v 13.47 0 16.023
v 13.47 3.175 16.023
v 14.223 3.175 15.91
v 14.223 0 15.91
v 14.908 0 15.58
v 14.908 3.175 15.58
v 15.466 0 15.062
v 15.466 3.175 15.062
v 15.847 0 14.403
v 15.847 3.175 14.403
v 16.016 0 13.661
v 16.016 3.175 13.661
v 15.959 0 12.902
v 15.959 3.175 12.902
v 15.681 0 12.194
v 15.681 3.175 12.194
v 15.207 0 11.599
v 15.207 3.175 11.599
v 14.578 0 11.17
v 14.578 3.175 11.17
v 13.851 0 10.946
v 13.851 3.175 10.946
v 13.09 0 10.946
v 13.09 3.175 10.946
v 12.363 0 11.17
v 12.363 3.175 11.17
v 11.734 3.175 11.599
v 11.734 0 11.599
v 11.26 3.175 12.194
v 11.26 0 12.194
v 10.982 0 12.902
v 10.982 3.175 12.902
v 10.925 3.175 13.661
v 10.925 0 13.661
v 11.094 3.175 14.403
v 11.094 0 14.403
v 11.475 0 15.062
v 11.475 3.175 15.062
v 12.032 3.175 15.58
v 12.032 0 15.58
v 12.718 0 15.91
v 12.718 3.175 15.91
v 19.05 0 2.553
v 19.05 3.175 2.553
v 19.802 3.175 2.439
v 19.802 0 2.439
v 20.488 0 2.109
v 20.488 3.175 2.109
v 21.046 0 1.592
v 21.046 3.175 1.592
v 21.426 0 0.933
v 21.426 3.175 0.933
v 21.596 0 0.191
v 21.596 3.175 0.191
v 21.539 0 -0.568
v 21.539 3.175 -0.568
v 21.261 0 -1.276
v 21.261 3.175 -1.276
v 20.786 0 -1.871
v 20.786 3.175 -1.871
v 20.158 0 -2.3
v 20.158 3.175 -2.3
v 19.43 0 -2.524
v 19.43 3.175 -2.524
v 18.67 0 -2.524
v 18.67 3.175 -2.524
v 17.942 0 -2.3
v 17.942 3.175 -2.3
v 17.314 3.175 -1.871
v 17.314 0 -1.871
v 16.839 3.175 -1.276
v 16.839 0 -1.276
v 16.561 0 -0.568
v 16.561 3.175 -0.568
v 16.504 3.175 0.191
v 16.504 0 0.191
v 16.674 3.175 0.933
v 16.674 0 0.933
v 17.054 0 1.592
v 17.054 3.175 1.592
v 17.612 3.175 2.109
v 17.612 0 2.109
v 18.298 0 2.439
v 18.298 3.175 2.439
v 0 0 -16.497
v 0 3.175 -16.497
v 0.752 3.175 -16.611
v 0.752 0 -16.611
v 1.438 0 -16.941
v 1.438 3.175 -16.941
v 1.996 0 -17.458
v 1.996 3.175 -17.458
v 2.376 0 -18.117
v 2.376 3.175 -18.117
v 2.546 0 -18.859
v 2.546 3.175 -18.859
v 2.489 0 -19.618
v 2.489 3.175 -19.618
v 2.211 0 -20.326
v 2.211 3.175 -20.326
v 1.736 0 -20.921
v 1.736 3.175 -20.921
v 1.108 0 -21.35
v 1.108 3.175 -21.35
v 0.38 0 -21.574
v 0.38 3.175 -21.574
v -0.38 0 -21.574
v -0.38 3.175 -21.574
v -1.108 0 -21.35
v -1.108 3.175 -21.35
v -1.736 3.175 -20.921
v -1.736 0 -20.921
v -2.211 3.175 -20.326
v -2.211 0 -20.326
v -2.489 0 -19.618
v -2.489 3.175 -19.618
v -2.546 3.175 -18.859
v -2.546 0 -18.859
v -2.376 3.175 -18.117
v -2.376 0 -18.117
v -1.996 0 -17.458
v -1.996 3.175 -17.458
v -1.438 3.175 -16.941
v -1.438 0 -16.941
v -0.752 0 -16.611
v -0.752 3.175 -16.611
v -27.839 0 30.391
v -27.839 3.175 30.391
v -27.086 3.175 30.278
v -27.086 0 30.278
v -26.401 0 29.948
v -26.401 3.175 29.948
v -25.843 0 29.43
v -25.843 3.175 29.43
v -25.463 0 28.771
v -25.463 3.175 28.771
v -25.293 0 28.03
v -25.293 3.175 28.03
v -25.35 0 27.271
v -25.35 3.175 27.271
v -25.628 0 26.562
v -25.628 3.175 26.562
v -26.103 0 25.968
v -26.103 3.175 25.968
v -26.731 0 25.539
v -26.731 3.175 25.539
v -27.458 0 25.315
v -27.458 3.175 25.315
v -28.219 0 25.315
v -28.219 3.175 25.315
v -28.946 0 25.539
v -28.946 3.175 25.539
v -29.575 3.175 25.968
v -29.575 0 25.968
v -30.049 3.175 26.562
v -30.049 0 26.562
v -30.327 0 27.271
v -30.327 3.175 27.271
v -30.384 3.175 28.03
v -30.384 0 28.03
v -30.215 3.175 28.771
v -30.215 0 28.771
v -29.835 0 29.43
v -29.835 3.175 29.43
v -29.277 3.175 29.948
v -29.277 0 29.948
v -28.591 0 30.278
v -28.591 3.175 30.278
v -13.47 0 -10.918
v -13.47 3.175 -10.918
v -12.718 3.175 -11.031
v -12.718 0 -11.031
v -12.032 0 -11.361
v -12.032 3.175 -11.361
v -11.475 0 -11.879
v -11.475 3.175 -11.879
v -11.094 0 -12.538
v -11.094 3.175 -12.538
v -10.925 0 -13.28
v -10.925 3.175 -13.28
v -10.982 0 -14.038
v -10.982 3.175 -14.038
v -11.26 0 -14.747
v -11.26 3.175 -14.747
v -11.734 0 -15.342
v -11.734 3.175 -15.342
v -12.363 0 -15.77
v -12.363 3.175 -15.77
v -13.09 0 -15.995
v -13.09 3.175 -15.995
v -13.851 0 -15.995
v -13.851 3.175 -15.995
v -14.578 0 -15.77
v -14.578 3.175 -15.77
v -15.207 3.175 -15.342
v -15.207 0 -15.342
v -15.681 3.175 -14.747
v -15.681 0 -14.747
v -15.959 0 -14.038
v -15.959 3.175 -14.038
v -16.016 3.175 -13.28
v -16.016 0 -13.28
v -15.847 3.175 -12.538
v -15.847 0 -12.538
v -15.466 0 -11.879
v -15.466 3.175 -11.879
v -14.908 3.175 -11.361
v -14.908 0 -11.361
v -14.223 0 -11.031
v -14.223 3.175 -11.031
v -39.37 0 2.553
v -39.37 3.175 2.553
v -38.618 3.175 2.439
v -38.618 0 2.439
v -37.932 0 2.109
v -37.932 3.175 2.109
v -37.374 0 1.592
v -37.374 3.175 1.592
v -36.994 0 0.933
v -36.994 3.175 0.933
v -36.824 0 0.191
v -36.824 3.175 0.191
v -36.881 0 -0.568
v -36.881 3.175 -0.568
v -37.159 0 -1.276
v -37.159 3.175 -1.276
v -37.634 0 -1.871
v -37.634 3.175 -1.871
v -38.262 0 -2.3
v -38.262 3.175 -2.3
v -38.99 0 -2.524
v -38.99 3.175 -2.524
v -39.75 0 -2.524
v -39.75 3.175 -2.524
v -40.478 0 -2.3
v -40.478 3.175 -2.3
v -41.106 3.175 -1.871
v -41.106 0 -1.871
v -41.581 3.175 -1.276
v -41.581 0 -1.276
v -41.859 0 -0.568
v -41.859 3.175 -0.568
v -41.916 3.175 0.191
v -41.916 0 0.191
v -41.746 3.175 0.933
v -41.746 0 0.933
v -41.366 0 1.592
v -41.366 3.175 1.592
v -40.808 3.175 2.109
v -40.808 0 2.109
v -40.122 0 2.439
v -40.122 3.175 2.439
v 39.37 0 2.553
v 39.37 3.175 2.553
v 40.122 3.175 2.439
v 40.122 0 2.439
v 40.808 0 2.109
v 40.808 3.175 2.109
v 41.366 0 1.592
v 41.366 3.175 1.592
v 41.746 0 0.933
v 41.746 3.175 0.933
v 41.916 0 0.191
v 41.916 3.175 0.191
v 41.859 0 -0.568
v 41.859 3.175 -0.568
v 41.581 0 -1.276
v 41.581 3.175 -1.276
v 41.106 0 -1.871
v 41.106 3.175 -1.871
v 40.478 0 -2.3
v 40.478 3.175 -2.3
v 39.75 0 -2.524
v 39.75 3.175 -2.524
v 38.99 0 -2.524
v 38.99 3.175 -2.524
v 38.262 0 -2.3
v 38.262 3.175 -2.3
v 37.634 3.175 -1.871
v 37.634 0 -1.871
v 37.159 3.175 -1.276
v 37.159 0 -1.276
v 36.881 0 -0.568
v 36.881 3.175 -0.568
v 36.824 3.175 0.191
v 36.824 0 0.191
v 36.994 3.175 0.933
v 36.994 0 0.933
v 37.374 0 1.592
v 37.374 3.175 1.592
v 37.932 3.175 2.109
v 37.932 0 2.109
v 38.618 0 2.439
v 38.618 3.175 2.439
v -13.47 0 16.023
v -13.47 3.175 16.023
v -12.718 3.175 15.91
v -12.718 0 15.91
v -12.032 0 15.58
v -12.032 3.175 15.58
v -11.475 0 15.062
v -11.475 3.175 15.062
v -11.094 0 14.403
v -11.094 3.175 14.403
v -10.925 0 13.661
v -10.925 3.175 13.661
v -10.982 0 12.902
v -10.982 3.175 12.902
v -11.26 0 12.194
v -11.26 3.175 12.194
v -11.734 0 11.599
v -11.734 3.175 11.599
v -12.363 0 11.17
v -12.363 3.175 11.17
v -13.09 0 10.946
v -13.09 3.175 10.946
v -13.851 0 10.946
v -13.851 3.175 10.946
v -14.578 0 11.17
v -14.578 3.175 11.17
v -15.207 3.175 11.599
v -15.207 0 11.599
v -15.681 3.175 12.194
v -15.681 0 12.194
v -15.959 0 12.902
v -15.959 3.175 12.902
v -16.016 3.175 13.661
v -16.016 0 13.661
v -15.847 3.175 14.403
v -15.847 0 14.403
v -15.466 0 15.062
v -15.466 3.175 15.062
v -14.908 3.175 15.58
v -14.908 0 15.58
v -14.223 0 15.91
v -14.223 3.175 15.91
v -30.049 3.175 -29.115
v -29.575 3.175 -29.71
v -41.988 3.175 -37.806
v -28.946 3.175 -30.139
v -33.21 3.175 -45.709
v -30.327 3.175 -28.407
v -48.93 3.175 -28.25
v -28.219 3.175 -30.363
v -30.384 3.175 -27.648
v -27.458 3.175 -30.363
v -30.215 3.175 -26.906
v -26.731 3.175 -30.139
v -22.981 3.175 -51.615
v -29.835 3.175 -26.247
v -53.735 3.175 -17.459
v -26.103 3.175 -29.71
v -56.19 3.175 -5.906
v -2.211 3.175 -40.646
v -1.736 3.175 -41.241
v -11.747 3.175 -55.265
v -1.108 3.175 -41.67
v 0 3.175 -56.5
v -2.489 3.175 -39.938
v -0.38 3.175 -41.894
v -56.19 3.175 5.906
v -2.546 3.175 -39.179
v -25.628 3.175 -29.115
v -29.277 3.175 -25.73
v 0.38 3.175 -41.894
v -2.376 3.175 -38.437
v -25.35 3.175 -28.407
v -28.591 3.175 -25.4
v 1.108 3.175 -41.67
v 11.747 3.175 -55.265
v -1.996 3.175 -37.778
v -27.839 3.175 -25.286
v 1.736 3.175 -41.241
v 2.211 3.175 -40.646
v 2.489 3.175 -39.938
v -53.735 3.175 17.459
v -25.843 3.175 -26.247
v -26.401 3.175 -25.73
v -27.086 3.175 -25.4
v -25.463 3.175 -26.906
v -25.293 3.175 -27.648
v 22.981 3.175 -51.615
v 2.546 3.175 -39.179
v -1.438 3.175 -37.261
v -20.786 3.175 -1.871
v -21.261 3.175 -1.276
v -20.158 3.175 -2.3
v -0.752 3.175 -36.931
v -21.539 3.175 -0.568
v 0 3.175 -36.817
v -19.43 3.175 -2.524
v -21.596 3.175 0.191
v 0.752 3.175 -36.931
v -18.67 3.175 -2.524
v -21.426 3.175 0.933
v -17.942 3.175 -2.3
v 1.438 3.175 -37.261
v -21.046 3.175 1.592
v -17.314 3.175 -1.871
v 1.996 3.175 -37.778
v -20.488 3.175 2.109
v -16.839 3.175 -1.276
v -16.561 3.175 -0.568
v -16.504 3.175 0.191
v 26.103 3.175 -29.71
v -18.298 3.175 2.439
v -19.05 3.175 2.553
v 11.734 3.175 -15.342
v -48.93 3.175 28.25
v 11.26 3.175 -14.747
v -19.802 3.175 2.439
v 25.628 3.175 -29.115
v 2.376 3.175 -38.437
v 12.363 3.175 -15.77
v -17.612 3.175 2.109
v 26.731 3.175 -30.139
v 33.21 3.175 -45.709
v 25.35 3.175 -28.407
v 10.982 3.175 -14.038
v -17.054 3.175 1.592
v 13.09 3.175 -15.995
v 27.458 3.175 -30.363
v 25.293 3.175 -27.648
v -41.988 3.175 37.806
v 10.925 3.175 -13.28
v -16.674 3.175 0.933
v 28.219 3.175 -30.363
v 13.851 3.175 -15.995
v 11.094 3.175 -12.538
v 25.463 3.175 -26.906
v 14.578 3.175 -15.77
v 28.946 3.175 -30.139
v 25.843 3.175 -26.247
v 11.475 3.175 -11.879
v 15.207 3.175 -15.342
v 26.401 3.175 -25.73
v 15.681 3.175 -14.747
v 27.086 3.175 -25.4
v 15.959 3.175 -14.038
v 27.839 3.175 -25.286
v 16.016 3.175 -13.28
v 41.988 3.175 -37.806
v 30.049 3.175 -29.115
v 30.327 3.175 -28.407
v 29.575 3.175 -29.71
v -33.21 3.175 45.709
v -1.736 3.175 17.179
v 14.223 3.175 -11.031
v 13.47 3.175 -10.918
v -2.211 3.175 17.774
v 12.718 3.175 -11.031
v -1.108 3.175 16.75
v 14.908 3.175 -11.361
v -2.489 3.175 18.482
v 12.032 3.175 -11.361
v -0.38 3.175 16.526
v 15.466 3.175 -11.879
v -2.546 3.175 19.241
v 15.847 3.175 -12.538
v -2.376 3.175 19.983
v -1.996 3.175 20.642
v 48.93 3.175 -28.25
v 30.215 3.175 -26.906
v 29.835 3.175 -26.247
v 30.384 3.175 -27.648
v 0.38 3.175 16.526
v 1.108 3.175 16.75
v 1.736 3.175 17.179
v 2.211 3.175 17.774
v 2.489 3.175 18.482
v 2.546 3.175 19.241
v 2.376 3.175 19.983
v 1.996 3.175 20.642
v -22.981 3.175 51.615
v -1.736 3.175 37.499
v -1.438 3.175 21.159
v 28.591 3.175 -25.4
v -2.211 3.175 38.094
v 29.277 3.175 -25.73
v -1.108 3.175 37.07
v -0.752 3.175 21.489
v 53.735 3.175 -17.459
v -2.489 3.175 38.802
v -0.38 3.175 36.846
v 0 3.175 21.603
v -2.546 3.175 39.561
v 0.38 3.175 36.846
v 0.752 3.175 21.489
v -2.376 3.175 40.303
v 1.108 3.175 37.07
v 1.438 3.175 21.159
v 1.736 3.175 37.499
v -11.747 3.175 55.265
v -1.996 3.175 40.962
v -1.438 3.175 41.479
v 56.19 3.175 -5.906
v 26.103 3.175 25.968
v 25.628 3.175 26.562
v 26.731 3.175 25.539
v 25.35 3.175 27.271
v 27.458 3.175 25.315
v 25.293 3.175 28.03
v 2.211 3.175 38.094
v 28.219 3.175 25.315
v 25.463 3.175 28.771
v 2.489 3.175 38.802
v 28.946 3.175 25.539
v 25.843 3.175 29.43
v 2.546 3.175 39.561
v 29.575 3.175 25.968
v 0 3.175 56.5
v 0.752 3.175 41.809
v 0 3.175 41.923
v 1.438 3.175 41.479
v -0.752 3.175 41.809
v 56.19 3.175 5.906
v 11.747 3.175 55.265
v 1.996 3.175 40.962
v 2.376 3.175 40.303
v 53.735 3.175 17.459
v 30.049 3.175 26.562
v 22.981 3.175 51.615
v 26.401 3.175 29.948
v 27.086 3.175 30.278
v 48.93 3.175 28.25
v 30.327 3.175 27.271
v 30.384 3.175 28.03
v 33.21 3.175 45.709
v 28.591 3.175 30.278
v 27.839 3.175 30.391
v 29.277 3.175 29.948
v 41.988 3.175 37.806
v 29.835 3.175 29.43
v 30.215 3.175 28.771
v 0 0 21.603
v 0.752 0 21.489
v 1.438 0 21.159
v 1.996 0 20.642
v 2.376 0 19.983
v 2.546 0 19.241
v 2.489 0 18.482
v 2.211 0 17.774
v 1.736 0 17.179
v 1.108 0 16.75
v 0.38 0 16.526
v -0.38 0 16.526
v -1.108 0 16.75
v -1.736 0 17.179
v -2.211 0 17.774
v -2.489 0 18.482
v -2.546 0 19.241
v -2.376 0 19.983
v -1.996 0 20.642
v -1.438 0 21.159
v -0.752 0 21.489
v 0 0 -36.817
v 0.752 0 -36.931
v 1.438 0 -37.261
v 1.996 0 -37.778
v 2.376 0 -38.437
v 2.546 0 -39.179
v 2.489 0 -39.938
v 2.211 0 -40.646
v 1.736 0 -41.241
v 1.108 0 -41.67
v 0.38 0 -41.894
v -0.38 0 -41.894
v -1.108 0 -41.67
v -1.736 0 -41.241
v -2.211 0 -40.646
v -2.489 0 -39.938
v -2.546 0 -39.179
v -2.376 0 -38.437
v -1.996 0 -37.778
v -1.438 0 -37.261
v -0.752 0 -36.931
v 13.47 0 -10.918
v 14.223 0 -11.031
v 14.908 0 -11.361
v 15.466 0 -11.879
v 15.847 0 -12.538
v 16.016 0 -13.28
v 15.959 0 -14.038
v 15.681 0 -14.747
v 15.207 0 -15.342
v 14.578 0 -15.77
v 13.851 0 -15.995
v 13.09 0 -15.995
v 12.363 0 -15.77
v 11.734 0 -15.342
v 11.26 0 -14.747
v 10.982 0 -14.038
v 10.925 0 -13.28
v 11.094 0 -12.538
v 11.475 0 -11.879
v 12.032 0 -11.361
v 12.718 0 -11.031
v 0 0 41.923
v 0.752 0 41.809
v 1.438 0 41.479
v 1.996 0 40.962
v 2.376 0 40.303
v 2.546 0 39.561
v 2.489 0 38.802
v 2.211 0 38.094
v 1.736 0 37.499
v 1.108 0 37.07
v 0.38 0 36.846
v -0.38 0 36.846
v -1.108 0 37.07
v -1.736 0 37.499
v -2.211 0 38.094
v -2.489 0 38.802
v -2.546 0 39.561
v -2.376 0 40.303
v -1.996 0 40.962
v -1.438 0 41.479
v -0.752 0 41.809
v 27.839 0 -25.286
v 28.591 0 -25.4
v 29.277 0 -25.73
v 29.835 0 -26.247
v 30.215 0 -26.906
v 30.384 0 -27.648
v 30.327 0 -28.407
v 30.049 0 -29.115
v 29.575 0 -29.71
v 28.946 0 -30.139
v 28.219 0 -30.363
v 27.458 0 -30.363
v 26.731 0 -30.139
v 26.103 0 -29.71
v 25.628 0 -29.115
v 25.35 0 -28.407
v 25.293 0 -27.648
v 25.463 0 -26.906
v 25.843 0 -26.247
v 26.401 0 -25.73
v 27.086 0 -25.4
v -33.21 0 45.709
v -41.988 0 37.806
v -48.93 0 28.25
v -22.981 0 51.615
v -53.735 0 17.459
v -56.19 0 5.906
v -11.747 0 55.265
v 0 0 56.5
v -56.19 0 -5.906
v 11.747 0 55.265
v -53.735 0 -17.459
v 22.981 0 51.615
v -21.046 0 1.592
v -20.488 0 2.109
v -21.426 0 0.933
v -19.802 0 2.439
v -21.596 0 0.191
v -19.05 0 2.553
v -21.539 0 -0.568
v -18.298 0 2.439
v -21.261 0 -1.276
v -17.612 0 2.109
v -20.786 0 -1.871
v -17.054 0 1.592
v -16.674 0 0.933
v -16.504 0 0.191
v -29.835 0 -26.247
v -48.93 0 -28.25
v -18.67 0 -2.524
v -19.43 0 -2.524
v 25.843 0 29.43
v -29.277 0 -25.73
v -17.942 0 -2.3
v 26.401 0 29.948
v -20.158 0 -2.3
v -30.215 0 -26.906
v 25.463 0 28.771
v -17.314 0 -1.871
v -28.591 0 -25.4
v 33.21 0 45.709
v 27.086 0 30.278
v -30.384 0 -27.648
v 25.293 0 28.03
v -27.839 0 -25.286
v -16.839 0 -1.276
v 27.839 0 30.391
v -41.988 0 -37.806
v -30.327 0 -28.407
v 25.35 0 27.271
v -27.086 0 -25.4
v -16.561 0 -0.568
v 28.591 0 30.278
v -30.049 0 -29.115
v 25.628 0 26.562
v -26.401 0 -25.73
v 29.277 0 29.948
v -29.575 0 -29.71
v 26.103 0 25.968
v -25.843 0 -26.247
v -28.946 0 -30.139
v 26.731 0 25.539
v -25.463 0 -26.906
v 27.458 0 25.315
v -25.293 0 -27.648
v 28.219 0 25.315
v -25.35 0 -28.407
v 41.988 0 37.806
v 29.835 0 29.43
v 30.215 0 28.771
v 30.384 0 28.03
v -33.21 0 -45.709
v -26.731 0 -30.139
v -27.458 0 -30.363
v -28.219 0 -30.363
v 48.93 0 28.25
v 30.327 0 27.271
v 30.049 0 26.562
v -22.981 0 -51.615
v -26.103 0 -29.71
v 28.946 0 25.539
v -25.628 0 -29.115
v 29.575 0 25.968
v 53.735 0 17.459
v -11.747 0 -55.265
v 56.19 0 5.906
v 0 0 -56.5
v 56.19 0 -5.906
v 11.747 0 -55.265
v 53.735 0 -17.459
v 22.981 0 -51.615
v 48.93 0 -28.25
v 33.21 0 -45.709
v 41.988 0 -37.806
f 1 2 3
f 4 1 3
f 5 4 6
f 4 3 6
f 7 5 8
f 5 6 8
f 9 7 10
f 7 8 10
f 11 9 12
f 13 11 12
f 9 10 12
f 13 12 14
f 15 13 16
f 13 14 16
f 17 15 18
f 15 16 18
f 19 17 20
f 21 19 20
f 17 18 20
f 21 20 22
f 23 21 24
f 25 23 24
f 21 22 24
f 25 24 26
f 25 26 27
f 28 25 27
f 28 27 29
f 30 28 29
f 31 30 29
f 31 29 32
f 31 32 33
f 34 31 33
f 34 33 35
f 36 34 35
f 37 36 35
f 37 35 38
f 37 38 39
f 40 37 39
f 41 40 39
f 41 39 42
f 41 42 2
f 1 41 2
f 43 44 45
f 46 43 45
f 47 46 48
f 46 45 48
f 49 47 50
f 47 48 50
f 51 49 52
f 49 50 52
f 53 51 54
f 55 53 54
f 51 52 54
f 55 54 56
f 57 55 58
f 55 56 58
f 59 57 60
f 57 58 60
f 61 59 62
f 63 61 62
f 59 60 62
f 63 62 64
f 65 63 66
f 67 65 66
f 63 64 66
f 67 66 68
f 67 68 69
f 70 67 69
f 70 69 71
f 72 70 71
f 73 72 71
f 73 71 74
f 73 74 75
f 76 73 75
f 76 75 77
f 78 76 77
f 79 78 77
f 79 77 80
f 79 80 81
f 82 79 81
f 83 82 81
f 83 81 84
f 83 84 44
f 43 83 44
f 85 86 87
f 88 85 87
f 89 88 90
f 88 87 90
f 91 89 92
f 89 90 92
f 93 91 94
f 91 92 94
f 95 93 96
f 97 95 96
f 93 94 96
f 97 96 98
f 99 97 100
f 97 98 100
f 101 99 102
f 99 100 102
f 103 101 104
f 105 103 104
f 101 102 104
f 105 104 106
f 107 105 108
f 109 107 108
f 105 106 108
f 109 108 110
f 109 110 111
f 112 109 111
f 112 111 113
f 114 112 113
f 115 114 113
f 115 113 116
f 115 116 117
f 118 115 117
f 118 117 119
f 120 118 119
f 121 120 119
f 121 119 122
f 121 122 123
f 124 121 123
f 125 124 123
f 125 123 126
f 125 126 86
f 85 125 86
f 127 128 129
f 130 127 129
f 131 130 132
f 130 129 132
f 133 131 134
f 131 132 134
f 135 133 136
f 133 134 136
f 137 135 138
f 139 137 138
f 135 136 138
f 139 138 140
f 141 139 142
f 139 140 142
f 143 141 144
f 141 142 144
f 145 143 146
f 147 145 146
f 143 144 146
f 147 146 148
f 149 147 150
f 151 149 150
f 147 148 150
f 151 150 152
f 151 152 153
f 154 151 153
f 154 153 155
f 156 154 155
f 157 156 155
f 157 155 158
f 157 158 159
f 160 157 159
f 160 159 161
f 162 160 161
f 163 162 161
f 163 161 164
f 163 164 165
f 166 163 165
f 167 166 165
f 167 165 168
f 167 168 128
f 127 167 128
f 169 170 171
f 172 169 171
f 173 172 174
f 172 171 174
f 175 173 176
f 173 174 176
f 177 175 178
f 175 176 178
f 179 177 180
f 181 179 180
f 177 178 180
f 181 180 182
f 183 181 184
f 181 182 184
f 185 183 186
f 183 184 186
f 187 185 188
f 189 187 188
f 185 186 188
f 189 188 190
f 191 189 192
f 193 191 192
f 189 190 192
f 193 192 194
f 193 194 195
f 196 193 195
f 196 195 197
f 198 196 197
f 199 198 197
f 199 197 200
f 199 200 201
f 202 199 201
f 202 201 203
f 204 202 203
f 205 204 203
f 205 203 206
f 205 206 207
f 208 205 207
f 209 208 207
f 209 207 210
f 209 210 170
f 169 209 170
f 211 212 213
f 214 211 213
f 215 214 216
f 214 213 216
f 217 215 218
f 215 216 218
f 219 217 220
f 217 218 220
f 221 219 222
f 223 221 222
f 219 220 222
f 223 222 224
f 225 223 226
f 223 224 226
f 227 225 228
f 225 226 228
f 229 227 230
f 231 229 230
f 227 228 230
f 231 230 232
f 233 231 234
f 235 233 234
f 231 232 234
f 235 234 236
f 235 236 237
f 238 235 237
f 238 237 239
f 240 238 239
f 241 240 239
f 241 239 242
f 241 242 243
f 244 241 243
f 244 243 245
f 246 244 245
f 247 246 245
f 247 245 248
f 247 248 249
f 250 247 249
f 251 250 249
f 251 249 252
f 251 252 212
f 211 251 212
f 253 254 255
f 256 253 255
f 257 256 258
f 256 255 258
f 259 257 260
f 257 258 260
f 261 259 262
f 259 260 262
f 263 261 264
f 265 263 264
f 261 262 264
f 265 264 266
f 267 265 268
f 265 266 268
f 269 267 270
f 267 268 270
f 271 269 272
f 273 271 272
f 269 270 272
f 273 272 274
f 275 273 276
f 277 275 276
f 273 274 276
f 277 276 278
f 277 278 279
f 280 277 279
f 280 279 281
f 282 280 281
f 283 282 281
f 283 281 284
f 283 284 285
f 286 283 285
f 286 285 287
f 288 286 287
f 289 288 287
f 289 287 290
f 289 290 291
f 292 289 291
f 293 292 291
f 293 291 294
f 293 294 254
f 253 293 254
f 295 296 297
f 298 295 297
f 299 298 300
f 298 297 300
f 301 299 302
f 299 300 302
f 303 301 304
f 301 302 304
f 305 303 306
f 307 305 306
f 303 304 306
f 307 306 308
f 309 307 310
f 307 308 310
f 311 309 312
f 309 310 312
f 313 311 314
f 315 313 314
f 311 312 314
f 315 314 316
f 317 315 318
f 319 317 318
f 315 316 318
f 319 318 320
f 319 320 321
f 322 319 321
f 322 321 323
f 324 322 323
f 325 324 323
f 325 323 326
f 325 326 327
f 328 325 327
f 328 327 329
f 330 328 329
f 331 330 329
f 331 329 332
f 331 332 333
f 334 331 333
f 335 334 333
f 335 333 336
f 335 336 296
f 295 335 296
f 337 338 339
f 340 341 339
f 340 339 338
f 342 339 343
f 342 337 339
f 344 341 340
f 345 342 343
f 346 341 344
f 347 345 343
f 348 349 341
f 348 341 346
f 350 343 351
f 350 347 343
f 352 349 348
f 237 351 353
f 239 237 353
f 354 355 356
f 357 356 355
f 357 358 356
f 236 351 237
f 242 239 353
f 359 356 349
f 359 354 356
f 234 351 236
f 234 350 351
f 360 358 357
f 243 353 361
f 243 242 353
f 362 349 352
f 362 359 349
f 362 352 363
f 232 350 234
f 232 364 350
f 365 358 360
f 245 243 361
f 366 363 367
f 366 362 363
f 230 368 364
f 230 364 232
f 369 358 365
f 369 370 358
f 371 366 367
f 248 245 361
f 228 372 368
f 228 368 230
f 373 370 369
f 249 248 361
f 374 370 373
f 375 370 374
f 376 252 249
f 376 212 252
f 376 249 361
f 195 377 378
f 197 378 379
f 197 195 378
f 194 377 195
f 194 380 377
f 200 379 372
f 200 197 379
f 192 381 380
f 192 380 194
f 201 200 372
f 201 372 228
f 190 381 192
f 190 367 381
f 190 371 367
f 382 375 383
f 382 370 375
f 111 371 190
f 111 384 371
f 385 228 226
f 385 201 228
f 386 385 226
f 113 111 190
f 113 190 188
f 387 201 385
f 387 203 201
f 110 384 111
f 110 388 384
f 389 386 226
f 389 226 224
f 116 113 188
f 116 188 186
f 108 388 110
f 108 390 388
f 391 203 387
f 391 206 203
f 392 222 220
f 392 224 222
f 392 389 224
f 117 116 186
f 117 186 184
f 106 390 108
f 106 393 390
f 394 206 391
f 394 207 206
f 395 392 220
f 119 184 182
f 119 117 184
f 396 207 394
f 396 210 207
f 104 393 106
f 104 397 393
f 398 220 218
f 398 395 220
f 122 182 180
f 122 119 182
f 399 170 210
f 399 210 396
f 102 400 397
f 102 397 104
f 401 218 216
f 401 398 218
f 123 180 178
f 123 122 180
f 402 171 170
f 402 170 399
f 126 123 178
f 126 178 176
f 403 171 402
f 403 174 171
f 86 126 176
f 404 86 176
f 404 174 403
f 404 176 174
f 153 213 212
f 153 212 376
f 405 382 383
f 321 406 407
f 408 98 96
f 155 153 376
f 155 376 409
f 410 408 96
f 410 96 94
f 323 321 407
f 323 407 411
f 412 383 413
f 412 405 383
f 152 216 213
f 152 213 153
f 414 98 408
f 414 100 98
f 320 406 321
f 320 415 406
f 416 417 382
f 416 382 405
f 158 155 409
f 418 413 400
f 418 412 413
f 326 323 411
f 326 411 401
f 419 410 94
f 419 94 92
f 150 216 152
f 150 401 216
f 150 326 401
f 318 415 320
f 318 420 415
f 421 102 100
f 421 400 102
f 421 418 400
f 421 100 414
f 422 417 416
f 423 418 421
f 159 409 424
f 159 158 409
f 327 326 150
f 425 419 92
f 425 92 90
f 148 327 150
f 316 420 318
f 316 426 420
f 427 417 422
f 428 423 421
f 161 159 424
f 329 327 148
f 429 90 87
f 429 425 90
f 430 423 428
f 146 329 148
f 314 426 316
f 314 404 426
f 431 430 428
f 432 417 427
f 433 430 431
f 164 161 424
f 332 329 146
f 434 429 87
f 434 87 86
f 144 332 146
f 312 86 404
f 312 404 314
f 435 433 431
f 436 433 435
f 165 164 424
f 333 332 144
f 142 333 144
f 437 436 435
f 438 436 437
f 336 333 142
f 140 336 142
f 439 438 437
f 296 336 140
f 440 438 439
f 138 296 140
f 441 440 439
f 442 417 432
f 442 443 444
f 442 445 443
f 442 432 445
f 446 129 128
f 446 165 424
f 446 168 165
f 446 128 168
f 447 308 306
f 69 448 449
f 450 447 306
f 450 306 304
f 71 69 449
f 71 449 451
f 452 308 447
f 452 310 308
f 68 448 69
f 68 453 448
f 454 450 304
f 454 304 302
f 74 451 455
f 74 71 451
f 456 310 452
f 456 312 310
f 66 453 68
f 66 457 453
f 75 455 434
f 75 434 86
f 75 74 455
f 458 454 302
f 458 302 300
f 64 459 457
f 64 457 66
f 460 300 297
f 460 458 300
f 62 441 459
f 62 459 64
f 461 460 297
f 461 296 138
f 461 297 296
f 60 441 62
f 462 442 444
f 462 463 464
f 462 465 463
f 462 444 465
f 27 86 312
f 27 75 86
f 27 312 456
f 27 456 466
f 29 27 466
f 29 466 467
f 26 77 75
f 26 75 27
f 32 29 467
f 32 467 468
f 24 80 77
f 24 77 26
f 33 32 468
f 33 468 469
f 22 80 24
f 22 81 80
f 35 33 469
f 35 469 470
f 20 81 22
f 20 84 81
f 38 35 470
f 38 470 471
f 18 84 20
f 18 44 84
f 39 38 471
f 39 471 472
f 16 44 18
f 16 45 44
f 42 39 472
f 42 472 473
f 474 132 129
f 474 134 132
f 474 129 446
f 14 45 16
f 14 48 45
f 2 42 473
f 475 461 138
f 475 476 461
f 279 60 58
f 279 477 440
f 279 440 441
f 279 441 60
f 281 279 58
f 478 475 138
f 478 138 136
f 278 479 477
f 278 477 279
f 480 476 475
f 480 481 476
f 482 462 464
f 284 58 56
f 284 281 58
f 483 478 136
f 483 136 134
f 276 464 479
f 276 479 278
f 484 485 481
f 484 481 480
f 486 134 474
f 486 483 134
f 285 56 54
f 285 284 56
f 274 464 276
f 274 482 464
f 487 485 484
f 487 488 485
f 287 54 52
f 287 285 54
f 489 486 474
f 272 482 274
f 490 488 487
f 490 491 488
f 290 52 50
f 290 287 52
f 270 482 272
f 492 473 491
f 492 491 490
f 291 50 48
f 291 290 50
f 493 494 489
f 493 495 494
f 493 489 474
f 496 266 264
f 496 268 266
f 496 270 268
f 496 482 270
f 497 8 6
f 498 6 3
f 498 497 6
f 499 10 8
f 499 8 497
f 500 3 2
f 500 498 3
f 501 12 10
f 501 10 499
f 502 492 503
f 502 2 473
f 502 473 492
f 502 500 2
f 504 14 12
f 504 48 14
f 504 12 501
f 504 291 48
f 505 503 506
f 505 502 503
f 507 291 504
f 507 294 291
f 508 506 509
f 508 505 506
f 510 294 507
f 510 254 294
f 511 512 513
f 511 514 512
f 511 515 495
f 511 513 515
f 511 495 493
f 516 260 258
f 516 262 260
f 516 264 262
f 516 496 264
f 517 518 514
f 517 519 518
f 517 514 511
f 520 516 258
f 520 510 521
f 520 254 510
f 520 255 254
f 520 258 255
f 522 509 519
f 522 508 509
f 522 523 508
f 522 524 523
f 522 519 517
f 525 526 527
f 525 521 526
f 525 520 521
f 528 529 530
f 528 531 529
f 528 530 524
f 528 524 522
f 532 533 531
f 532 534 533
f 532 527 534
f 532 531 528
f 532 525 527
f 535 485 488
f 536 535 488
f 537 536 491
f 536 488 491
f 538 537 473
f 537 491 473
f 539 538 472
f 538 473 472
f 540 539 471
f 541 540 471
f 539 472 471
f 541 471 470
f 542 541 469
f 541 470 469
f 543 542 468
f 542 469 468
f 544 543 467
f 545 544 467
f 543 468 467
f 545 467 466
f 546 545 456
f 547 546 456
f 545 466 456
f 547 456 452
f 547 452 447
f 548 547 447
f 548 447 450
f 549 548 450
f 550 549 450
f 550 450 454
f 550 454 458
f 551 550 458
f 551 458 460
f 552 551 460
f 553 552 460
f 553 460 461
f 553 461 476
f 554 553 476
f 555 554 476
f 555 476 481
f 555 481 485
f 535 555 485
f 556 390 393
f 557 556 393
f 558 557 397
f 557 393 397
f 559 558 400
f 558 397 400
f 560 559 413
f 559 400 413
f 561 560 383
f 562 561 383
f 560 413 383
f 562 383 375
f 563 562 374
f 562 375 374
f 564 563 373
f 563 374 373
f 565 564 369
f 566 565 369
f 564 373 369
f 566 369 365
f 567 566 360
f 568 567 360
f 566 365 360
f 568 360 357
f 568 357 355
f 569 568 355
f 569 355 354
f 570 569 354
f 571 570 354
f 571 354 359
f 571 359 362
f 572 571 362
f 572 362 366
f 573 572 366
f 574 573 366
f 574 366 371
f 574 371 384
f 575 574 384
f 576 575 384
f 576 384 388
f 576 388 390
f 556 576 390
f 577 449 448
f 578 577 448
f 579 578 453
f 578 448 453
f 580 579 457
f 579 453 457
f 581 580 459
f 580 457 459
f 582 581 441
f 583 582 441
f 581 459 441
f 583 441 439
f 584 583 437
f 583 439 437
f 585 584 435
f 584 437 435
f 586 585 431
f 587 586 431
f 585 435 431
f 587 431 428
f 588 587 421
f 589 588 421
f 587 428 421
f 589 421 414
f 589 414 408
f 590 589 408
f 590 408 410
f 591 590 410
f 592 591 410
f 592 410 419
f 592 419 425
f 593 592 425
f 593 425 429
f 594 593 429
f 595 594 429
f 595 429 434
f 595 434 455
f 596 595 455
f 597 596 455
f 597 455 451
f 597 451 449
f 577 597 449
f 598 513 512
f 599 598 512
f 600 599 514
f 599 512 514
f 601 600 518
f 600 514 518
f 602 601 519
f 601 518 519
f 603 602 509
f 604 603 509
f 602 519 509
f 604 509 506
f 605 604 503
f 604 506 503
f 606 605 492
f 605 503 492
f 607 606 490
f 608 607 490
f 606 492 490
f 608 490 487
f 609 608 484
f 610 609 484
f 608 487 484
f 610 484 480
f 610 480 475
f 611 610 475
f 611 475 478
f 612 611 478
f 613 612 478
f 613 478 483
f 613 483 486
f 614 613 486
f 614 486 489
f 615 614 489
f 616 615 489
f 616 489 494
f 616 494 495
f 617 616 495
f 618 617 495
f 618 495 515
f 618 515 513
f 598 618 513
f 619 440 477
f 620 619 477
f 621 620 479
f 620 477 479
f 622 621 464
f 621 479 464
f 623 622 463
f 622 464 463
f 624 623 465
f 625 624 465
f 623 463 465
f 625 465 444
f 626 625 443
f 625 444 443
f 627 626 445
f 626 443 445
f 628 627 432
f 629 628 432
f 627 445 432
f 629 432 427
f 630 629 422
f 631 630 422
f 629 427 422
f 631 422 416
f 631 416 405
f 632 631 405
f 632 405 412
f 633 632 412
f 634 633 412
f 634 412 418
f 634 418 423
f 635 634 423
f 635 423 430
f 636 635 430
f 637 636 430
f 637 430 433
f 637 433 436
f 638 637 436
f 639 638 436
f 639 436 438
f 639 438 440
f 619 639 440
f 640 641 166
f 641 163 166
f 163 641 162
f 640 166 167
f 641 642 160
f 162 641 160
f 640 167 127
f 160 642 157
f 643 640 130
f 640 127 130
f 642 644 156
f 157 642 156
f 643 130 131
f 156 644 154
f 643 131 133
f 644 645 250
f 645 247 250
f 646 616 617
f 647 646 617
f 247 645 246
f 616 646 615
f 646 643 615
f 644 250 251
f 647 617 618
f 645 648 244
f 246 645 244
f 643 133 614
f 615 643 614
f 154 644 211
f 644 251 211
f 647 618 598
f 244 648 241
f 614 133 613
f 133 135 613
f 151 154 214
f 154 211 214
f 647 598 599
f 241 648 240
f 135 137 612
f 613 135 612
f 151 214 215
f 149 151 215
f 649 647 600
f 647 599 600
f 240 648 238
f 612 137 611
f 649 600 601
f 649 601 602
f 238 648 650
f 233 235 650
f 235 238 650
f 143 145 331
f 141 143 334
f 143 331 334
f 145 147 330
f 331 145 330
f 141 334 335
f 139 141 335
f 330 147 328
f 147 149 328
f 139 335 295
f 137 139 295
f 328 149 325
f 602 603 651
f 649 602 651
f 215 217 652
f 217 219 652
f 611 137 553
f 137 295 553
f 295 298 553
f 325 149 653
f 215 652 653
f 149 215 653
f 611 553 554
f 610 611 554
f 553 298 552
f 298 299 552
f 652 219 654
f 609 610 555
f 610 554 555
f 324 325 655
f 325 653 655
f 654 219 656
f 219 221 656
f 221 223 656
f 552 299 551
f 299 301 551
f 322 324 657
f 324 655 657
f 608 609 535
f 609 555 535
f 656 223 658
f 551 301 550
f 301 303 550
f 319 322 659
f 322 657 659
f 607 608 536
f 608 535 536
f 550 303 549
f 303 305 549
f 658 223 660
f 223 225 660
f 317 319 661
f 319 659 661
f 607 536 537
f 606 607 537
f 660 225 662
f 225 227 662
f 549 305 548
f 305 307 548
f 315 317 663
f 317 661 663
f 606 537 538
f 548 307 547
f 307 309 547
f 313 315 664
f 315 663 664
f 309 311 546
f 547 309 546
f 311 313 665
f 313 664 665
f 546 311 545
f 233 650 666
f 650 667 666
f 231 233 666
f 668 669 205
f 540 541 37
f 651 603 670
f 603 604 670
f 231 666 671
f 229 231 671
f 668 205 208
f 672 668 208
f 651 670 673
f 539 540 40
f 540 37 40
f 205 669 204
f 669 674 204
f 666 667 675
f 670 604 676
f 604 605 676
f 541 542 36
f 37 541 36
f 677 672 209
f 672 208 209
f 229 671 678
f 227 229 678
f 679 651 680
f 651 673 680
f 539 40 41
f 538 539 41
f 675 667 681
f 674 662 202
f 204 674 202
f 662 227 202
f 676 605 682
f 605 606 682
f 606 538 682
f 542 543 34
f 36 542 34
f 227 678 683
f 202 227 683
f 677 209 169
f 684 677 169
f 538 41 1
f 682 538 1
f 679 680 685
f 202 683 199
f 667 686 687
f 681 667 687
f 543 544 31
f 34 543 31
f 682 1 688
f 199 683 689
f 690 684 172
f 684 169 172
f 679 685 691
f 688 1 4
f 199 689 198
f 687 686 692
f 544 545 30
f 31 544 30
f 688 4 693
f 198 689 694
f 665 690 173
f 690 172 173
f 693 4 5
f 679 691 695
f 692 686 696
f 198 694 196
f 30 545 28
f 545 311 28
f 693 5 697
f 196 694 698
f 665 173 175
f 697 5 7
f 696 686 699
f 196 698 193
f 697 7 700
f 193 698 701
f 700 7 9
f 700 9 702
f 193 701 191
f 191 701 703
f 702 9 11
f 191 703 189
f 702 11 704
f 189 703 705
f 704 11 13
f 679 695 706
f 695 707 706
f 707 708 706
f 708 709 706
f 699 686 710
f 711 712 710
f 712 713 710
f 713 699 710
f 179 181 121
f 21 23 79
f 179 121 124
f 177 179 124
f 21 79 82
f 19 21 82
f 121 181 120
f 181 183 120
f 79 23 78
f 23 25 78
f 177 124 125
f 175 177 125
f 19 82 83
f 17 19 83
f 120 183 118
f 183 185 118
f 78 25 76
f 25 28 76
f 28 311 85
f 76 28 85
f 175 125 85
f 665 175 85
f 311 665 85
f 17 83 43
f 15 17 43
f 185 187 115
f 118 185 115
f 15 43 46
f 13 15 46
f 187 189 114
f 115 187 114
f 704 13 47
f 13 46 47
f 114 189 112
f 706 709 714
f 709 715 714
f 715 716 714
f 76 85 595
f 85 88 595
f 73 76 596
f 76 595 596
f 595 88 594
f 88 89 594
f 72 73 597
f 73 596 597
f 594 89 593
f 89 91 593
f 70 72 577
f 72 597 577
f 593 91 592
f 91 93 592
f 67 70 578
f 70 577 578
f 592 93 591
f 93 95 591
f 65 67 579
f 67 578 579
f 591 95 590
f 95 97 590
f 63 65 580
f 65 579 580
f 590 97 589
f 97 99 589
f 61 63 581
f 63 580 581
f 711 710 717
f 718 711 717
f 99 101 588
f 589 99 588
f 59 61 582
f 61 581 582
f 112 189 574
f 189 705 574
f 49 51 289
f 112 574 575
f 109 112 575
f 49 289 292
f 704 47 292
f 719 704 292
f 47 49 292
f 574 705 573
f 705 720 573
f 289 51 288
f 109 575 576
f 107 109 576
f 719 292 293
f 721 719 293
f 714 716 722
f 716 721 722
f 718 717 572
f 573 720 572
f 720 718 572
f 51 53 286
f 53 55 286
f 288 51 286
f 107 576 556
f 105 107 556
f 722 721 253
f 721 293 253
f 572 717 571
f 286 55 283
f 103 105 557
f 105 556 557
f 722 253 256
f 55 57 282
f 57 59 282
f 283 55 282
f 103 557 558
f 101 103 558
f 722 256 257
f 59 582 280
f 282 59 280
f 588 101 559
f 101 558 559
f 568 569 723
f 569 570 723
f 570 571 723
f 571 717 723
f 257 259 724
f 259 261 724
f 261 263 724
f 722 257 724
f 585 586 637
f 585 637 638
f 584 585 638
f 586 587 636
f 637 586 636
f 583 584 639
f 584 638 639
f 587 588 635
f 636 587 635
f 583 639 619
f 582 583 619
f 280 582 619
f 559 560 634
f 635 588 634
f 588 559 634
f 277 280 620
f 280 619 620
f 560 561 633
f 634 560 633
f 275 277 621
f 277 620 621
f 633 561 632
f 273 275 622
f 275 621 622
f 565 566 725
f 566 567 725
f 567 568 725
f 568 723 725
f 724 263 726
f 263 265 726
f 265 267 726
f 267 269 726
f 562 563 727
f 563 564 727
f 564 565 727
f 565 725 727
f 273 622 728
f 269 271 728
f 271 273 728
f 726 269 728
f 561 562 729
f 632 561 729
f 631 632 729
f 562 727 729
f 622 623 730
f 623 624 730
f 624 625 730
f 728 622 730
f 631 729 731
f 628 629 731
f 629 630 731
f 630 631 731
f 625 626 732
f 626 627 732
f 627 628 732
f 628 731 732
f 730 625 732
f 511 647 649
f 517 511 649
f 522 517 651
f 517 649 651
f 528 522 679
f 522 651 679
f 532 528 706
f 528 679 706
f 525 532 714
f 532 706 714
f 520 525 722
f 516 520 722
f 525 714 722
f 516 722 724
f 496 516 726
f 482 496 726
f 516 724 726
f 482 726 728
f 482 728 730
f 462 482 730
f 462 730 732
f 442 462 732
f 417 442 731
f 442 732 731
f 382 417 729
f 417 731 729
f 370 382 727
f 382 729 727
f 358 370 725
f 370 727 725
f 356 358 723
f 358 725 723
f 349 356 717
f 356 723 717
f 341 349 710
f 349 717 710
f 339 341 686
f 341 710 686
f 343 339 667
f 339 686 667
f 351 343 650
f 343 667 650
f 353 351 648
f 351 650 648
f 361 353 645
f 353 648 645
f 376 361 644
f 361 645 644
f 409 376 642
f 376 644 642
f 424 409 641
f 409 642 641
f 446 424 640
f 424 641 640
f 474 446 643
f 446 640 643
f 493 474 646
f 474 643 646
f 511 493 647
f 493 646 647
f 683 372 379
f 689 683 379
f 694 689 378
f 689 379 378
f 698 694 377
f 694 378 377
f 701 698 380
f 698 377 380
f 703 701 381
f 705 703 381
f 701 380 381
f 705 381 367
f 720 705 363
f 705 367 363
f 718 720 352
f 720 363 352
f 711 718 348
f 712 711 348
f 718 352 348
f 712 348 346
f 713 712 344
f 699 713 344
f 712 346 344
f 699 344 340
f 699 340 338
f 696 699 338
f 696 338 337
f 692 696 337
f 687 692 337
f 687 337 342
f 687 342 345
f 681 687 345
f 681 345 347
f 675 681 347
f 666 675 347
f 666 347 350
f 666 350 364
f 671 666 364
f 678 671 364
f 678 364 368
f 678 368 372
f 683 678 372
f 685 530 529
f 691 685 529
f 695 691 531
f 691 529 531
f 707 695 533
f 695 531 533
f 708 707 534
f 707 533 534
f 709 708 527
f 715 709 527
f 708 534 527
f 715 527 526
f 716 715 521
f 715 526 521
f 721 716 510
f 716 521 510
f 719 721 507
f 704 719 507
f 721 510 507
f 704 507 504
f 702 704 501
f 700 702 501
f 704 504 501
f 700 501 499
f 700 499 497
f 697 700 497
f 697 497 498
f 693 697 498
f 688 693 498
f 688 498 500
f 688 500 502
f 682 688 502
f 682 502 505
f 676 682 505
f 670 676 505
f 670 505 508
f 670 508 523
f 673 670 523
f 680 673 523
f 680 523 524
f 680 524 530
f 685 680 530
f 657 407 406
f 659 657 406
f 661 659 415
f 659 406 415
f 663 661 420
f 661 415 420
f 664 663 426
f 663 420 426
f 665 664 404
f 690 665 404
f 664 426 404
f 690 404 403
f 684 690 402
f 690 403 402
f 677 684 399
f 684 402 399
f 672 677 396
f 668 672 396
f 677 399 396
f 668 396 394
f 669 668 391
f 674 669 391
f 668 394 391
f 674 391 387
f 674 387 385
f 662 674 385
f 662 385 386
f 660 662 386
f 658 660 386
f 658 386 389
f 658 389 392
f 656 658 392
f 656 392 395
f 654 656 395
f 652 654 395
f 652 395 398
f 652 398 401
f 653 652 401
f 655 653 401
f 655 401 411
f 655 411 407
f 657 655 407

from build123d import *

# Parameters (mm, degrees)
SKETCH1_R               = 56.5
SKETCH1_R_2             = 2.5527
BOSS_EXTRUDE1_DEPTH     = 3.175
F_1_4_20_TAPPED_HOLE1_D = 5.1054


with BuildPart() as part:
    # Sketch1 → Boss-Extrude1 (new body)
    # profile 1 of 9: a face of its own
    with BuildSketch(Plane(origin=(0, 0, 0), x_dir=(1, 0, 0), z_dir=(0, 1, 0))):
        with Locations(Location((0, 0, 0), (0, 0, 270))):
            Circle(SKETCH1_R)
        with Locations((-13.470384182, 13.470384182)):
            Circle(SKETCH1_R_2, mode=Mode.SUBTRACT)
        with Locations((-19.05, 0)):
            Circle(SKETCH1_R_2, mode=Mode.SUBTRACT)
        with Locations((-13.470384182, -13.470384182)):
            Circle(SKETCH1_R_2, mode=Mode.SUBTRACT)
        with Locations((0, -19.05)):
            Circle(SKETCH1_R_2, mode=Mode.SUBTRACT)
        with Locations((13.470384182, -13.470384182)):
            Circle(SKETCH1_R_2, mode=Mode.SUBTRACT)
        with Locations((19.05, 0)):
            Circle(SKETCH1_R_2, mode=Mode.SUBTRACT)
        with Locations((13.470384182, 13.470384182)):
            Circle(SKETCH1_R_2, mode=Mode.SUBTRACT)
        with Locations((0, 19.05)):
            Circle(SKETCH1_R_2, mode=Mode.SUBTRACT)
    # profile 2 of 9: a face of its own
    with BuildSketch(Plane(origin=(0, 0, 0), x_dir=(1, 0, 0), z_dir=(0, 1, 0))):
        with Locations((13.470384182, 13.470384182)):
            Circle(SKETCH1_R_2)
    # profile 3 of 9: a face of its own
    with BuildSketch(Plane(origin=(0, 0, 0), x_dir=(1, 0, 0), z_dir=(0, 1, 0))):
        with Locations((0, 19.05)):
            Circle(SKETCH1_R_2)
    # profile 4 of 9: a face of its own
    with BuildSketch(Plane(origin=(0, 0, 0), x_dir=(1, 0, 0), z_dir=(0, 1, 0))):
        with Locations((19.05, 0)):
            Circle(SKETCH1_R_2)
    # profile 5 of 9: a face of its own
    with BuildSketch(Plane(origin=(0, 0, 0), x_dir=(1, 0, 0), z_dir=(0, 1, 0))):
        with Locations((13.470384182, -13.470384182)):
            Circle(SKETCH1_R_2)
    # profile 6 of 9: a face of its own
    with BuildSketch(Plane(origin=(0, 0, 0), x_dir=(1, 0, 0), z_dir=(0, 1, 0))):
        with Locations((0, -19.05)):
            Circle(SKETCH1_R_2)
    # profile 7 of 9: a face of its own
    with BuildSketch(Plane(origin=(0, 0, 0), x_dir=(1, 0, 0), z_dir=(0, 1, 0))):
        with Locations((-13.470384182, -13.470384182)):
            Circle(SKETCH1_R_2)
    # profile 8 of 9: a face of its own
    with BuildSketch(Plane(origin=(0, 0, 0), x_dir=(1, 0, 0), z_dir=(0, 1, 0))):
        with Locations((-13.470384182, 13.470384182)):
            Circle(SKETCH1_R_2)
    # profile 9 of 9: a face of its own
    with BuildSketch(Plane(origin=(0, 0, 0), x_dir=(1, 0, 0), z_dir=(0, 1, 0))):
        with Locations((-19.05, 0)):
            Circle(SKETCH1_R_2)
    extrude(amount=BOSS_EXTRUDE1_DEPTH)

    # 1/4-20 Tapped Hole1 (through all)
    with Locations(Plane(origin=(13.470384182, 0, -13.470384182), x_dir=(0, 0, -1), z_dir=(0, -1, 0))):
        with Locations((0, 0), (-13.470384182, 5.579615818), (-26.940768364, 0), (-32.520384182, -13.470384182), (-26.940768364, -26.940768364), (-13.470384182, -32.520384182), (0, -26.940768364), (5.579615818, -13.470384182), (25.899615818, -13.470384182), (14.368409793, -41.309178157), (-13.470384182, -52.840384182), (-41.309178157, -41.309178157), (-52.840384182, -13.470384182), (-41.309178157, 14.368409793), (-13.470384182, 25.899615818), (14.368409793, 14.368409793)):
            Hole(F_1_4_20_TAPPED_HOLE1_D / 2)


solid = part.part
